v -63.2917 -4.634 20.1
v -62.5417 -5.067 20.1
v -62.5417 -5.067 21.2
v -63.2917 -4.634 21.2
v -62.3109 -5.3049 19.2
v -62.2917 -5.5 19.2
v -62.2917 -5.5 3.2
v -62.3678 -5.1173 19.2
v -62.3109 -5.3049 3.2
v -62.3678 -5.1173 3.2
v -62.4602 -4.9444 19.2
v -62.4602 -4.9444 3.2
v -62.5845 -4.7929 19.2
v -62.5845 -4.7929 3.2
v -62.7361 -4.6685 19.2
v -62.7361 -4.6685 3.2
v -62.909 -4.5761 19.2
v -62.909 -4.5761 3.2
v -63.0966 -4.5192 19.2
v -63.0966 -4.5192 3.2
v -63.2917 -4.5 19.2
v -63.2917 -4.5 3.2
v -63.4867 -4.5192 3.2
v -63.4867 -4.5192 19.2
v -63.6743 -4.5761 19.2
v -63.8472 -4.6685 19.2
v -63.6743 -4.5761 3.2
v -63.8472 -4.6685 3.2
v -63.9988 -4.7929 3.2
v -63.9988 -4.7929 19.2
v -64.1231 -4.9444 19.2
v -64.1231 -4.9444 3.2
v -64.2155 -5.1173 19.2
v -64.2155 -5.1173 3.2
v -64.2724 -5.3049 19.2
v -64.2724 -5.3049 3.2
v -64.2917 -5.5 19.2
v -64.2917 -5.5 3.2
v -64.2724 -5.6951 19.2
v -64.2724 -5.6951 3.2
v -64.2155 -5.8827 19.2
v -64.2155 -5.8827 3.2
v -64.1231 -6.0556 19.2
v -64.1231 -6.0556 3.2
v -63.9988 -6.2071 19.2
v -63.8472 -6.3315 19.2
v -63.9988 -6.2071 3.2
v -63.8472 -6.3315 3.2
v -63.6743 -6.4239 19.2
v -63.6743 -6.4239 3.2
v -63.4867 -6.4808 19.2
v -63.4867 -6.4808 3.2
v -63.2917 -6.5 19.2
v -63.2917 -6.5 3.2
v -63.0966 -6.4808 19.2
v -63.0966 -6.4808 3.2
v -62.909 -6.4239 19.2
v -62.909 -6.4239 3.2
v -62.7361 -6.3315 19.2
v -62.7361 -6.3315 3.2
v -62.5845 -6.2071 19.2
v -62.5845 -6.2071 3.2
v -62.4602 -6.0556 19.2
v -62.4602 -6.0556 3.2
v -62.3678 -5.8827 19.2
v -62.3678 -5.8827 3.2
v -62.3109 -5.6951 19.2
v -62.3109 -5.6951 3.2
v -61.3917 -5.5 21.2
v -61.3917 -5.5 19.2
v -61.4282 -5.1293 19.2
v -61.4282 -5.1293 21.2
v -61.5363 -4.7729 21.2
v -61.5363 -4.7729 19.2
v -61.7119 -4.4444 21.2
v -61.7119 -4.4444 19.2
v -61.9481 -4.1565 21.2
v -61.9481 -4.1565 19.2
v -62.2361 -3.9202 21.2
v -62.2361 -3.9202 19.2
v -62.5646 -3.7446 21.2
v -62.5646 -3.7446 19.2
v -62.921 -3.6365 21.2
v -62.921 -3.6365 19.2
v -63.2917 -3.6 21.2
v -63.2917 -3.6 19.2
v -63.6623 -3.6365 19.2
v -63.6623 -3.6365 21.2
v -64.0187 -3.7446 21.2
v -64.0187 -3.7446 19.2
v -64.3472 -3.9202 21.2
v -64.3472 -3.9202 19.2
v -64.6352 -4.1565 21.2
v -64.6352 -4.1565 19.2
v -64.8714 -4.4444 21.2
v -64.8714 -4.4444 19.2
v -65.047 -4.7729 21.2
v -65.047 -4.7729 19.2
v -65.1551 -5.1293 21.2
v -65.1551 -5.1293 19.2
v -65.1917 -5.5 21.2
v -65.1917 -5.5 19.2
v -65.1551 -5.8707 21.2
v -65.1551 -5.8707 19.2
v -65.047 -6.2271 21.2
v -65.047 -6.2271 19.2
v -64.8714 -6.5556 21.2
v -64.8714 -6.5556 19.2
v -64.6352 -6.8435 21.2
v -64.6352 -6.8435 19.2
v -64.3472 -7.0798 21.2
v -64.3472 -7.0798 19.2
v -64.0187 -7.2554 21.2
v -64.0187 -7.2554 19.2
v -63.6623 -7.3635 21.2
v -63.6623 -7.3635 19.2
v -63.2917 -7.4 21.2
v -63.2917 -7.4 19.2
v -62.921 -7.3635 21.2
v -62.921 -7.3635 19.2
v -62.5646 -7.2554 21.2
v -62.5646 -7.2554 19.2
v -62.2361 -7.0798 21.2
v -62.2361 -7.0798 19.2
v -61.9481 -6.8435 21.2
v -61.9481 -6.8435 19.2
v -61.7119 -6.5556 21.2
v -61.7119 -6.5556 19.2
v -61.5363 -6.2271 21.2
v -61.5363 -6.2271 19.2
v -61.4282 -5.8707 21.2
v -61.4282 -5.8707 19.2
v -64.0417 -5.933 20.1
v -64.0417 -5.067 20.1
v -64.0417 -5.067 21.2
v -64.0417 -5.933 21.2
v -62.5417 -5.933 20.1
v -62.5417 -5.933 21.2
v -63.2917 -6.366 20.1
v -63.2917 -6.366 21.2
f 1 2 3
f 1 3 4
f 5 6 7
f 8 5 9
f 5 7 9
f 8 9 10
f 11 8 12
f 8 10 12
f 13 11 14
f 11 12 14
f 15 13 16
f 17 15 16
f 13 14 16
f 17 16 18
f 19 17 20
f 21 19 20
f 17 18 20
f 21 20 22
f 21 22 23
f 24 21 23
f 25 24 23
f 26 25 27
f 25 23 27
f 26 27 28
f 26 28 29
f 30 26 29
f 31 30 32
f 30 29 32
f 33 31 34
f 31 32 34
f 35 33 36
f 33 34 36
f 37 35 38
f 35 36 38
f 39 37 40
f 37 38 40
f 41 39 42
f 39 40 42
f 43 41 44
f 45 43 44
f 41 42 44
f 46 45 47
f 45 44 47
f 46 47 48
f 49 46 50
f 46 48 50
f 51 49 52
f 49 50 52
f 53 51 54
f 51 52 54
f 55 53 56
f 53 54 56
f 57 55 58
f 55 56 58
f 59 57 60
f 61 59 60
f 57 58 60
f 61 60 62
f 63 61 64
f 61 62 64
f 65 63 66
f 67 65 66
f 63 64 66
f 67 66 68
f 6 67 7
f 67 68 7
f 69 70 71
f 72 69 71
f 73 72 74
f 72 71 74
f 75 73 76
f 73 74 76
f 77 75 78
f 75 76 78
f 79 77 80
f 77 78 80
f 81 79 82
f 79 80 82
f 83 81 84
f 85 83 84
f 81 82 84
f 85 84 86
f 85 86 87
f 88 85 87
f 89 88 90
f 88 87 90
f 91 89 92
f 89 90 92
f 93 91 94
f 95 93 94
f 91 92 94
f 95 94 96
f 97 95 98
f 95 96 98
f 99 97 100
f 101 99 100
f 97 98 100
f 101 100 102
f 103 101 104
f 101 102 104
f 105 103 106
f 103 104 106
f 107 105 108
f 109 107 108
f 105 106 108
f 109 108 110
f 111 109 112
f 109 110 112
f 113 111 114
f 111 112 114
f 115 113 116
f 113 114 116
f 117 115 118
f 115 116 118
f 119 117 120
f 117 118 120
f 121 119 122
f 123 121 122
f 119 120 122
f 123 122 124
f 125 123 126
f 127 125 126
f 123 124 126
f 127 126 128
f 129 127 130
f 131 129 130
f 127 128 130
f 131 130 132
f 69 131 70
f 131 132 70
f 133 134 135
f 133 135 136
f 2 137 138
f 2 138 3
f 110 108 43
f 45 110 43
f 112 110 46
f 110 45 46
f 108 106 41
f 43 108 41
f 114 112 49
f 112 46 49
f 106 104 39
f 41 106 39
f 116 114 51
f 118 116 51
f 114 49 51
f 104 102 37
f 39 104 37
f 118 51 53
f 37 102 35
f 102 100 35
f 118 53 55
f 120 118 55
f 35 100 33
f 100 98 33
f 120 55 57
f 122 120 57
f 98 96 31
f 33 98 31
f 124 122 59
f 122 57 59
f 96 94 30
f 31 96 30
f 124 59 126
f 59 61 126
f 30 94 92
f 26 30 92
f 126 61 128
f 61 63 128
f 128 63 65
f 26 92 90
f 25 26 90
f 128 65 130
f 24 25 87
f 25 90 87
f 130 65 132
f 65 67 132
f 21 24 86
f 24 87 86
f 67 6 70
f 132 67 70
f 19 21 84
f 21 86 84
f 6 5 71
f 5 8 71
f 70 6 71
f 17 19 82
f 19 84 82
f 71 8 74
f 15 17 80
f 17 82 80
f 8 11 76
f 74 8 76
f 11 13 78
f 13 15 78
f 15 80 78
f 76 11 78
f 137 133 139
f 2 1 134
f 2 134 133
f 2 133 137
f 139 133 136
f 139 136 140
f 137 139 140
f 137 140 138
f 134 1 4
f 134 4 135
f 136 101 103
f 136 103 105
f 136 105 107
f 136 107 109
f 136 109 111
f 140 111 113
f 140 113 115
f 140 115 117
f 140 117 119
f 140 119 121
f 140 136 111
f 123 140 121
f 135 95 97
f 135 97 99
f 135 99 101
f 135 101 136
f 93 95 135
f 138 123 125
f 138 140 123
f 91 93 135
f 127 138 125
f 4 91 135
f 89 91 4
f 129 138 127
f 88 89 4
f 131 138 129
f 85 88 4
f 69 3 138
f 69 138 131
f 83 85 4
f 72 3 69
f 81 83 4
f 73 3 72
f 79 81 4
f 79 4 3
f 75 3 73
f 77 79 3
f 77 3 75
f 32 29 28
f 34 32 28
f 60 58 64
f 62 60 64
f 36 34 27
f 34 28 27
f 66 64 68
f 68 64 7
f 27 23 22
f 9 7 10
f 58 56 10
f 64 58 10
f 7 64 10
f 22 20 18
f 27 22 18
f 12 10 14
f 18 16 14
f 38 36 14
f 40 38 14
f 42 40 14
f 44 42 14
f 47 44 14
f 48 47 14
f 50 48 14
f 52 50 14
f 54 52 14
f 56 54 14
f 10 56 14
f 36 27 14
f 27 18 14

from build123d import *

# Parameters (mm, degrees)
M2_SCREW_SHANK_PROFILE_R  = 1
M2_SCREW_SHANK_DEPTH      = 16
SOCKET_CAP_HEAD_PROFILE_R = 1.9
SOCKET_CAP_HEAD_DEPTH     = 2
CUT_HEX_KEY_RECESS_DEPTH  = 1.2


with BuildPart() as part:
    # M2 screw shank profile → M2 screw shank (new body)
    with BuildSketch(Plane.XY.offset(3.2)):
        with Locations((-63.291651246, -5.5)):
            Circle(M2_SCREW_SHANK_PROFILE_R)
    extrude(amount=M2_SCREW_SHANK_DEPTH)

    # Socket cap head profile → Socket cap head (add)
    with BuildSketch(Plane.XY.offset(19.2)):
        with Locations((-63.291651246, -5.5)):
            Circle(SOCKET_CAP_HEAD_PROFILE_R)
    extrude(amount=SOCKET_CAP_HEAD_DEPTH)

    # Hex key socket → Cut hex key recess (cut)
    with BuildSketch(Plane.XY.offset(20.1)):
        Polygon((-62.541651246, -5.066987298), (-63.291651246, -4.633974596), (-64.041651246, -5.066987298), (-64.041651246, -5.933012702), (-63.291651246, -6.366025404), (-62.541651246, -5.933012702), align=None)
    extrude(amount=CUT_HEX_KEY_RECESS_DEPTH, mode=Mode.SUBTRACT)


solid = part.part
